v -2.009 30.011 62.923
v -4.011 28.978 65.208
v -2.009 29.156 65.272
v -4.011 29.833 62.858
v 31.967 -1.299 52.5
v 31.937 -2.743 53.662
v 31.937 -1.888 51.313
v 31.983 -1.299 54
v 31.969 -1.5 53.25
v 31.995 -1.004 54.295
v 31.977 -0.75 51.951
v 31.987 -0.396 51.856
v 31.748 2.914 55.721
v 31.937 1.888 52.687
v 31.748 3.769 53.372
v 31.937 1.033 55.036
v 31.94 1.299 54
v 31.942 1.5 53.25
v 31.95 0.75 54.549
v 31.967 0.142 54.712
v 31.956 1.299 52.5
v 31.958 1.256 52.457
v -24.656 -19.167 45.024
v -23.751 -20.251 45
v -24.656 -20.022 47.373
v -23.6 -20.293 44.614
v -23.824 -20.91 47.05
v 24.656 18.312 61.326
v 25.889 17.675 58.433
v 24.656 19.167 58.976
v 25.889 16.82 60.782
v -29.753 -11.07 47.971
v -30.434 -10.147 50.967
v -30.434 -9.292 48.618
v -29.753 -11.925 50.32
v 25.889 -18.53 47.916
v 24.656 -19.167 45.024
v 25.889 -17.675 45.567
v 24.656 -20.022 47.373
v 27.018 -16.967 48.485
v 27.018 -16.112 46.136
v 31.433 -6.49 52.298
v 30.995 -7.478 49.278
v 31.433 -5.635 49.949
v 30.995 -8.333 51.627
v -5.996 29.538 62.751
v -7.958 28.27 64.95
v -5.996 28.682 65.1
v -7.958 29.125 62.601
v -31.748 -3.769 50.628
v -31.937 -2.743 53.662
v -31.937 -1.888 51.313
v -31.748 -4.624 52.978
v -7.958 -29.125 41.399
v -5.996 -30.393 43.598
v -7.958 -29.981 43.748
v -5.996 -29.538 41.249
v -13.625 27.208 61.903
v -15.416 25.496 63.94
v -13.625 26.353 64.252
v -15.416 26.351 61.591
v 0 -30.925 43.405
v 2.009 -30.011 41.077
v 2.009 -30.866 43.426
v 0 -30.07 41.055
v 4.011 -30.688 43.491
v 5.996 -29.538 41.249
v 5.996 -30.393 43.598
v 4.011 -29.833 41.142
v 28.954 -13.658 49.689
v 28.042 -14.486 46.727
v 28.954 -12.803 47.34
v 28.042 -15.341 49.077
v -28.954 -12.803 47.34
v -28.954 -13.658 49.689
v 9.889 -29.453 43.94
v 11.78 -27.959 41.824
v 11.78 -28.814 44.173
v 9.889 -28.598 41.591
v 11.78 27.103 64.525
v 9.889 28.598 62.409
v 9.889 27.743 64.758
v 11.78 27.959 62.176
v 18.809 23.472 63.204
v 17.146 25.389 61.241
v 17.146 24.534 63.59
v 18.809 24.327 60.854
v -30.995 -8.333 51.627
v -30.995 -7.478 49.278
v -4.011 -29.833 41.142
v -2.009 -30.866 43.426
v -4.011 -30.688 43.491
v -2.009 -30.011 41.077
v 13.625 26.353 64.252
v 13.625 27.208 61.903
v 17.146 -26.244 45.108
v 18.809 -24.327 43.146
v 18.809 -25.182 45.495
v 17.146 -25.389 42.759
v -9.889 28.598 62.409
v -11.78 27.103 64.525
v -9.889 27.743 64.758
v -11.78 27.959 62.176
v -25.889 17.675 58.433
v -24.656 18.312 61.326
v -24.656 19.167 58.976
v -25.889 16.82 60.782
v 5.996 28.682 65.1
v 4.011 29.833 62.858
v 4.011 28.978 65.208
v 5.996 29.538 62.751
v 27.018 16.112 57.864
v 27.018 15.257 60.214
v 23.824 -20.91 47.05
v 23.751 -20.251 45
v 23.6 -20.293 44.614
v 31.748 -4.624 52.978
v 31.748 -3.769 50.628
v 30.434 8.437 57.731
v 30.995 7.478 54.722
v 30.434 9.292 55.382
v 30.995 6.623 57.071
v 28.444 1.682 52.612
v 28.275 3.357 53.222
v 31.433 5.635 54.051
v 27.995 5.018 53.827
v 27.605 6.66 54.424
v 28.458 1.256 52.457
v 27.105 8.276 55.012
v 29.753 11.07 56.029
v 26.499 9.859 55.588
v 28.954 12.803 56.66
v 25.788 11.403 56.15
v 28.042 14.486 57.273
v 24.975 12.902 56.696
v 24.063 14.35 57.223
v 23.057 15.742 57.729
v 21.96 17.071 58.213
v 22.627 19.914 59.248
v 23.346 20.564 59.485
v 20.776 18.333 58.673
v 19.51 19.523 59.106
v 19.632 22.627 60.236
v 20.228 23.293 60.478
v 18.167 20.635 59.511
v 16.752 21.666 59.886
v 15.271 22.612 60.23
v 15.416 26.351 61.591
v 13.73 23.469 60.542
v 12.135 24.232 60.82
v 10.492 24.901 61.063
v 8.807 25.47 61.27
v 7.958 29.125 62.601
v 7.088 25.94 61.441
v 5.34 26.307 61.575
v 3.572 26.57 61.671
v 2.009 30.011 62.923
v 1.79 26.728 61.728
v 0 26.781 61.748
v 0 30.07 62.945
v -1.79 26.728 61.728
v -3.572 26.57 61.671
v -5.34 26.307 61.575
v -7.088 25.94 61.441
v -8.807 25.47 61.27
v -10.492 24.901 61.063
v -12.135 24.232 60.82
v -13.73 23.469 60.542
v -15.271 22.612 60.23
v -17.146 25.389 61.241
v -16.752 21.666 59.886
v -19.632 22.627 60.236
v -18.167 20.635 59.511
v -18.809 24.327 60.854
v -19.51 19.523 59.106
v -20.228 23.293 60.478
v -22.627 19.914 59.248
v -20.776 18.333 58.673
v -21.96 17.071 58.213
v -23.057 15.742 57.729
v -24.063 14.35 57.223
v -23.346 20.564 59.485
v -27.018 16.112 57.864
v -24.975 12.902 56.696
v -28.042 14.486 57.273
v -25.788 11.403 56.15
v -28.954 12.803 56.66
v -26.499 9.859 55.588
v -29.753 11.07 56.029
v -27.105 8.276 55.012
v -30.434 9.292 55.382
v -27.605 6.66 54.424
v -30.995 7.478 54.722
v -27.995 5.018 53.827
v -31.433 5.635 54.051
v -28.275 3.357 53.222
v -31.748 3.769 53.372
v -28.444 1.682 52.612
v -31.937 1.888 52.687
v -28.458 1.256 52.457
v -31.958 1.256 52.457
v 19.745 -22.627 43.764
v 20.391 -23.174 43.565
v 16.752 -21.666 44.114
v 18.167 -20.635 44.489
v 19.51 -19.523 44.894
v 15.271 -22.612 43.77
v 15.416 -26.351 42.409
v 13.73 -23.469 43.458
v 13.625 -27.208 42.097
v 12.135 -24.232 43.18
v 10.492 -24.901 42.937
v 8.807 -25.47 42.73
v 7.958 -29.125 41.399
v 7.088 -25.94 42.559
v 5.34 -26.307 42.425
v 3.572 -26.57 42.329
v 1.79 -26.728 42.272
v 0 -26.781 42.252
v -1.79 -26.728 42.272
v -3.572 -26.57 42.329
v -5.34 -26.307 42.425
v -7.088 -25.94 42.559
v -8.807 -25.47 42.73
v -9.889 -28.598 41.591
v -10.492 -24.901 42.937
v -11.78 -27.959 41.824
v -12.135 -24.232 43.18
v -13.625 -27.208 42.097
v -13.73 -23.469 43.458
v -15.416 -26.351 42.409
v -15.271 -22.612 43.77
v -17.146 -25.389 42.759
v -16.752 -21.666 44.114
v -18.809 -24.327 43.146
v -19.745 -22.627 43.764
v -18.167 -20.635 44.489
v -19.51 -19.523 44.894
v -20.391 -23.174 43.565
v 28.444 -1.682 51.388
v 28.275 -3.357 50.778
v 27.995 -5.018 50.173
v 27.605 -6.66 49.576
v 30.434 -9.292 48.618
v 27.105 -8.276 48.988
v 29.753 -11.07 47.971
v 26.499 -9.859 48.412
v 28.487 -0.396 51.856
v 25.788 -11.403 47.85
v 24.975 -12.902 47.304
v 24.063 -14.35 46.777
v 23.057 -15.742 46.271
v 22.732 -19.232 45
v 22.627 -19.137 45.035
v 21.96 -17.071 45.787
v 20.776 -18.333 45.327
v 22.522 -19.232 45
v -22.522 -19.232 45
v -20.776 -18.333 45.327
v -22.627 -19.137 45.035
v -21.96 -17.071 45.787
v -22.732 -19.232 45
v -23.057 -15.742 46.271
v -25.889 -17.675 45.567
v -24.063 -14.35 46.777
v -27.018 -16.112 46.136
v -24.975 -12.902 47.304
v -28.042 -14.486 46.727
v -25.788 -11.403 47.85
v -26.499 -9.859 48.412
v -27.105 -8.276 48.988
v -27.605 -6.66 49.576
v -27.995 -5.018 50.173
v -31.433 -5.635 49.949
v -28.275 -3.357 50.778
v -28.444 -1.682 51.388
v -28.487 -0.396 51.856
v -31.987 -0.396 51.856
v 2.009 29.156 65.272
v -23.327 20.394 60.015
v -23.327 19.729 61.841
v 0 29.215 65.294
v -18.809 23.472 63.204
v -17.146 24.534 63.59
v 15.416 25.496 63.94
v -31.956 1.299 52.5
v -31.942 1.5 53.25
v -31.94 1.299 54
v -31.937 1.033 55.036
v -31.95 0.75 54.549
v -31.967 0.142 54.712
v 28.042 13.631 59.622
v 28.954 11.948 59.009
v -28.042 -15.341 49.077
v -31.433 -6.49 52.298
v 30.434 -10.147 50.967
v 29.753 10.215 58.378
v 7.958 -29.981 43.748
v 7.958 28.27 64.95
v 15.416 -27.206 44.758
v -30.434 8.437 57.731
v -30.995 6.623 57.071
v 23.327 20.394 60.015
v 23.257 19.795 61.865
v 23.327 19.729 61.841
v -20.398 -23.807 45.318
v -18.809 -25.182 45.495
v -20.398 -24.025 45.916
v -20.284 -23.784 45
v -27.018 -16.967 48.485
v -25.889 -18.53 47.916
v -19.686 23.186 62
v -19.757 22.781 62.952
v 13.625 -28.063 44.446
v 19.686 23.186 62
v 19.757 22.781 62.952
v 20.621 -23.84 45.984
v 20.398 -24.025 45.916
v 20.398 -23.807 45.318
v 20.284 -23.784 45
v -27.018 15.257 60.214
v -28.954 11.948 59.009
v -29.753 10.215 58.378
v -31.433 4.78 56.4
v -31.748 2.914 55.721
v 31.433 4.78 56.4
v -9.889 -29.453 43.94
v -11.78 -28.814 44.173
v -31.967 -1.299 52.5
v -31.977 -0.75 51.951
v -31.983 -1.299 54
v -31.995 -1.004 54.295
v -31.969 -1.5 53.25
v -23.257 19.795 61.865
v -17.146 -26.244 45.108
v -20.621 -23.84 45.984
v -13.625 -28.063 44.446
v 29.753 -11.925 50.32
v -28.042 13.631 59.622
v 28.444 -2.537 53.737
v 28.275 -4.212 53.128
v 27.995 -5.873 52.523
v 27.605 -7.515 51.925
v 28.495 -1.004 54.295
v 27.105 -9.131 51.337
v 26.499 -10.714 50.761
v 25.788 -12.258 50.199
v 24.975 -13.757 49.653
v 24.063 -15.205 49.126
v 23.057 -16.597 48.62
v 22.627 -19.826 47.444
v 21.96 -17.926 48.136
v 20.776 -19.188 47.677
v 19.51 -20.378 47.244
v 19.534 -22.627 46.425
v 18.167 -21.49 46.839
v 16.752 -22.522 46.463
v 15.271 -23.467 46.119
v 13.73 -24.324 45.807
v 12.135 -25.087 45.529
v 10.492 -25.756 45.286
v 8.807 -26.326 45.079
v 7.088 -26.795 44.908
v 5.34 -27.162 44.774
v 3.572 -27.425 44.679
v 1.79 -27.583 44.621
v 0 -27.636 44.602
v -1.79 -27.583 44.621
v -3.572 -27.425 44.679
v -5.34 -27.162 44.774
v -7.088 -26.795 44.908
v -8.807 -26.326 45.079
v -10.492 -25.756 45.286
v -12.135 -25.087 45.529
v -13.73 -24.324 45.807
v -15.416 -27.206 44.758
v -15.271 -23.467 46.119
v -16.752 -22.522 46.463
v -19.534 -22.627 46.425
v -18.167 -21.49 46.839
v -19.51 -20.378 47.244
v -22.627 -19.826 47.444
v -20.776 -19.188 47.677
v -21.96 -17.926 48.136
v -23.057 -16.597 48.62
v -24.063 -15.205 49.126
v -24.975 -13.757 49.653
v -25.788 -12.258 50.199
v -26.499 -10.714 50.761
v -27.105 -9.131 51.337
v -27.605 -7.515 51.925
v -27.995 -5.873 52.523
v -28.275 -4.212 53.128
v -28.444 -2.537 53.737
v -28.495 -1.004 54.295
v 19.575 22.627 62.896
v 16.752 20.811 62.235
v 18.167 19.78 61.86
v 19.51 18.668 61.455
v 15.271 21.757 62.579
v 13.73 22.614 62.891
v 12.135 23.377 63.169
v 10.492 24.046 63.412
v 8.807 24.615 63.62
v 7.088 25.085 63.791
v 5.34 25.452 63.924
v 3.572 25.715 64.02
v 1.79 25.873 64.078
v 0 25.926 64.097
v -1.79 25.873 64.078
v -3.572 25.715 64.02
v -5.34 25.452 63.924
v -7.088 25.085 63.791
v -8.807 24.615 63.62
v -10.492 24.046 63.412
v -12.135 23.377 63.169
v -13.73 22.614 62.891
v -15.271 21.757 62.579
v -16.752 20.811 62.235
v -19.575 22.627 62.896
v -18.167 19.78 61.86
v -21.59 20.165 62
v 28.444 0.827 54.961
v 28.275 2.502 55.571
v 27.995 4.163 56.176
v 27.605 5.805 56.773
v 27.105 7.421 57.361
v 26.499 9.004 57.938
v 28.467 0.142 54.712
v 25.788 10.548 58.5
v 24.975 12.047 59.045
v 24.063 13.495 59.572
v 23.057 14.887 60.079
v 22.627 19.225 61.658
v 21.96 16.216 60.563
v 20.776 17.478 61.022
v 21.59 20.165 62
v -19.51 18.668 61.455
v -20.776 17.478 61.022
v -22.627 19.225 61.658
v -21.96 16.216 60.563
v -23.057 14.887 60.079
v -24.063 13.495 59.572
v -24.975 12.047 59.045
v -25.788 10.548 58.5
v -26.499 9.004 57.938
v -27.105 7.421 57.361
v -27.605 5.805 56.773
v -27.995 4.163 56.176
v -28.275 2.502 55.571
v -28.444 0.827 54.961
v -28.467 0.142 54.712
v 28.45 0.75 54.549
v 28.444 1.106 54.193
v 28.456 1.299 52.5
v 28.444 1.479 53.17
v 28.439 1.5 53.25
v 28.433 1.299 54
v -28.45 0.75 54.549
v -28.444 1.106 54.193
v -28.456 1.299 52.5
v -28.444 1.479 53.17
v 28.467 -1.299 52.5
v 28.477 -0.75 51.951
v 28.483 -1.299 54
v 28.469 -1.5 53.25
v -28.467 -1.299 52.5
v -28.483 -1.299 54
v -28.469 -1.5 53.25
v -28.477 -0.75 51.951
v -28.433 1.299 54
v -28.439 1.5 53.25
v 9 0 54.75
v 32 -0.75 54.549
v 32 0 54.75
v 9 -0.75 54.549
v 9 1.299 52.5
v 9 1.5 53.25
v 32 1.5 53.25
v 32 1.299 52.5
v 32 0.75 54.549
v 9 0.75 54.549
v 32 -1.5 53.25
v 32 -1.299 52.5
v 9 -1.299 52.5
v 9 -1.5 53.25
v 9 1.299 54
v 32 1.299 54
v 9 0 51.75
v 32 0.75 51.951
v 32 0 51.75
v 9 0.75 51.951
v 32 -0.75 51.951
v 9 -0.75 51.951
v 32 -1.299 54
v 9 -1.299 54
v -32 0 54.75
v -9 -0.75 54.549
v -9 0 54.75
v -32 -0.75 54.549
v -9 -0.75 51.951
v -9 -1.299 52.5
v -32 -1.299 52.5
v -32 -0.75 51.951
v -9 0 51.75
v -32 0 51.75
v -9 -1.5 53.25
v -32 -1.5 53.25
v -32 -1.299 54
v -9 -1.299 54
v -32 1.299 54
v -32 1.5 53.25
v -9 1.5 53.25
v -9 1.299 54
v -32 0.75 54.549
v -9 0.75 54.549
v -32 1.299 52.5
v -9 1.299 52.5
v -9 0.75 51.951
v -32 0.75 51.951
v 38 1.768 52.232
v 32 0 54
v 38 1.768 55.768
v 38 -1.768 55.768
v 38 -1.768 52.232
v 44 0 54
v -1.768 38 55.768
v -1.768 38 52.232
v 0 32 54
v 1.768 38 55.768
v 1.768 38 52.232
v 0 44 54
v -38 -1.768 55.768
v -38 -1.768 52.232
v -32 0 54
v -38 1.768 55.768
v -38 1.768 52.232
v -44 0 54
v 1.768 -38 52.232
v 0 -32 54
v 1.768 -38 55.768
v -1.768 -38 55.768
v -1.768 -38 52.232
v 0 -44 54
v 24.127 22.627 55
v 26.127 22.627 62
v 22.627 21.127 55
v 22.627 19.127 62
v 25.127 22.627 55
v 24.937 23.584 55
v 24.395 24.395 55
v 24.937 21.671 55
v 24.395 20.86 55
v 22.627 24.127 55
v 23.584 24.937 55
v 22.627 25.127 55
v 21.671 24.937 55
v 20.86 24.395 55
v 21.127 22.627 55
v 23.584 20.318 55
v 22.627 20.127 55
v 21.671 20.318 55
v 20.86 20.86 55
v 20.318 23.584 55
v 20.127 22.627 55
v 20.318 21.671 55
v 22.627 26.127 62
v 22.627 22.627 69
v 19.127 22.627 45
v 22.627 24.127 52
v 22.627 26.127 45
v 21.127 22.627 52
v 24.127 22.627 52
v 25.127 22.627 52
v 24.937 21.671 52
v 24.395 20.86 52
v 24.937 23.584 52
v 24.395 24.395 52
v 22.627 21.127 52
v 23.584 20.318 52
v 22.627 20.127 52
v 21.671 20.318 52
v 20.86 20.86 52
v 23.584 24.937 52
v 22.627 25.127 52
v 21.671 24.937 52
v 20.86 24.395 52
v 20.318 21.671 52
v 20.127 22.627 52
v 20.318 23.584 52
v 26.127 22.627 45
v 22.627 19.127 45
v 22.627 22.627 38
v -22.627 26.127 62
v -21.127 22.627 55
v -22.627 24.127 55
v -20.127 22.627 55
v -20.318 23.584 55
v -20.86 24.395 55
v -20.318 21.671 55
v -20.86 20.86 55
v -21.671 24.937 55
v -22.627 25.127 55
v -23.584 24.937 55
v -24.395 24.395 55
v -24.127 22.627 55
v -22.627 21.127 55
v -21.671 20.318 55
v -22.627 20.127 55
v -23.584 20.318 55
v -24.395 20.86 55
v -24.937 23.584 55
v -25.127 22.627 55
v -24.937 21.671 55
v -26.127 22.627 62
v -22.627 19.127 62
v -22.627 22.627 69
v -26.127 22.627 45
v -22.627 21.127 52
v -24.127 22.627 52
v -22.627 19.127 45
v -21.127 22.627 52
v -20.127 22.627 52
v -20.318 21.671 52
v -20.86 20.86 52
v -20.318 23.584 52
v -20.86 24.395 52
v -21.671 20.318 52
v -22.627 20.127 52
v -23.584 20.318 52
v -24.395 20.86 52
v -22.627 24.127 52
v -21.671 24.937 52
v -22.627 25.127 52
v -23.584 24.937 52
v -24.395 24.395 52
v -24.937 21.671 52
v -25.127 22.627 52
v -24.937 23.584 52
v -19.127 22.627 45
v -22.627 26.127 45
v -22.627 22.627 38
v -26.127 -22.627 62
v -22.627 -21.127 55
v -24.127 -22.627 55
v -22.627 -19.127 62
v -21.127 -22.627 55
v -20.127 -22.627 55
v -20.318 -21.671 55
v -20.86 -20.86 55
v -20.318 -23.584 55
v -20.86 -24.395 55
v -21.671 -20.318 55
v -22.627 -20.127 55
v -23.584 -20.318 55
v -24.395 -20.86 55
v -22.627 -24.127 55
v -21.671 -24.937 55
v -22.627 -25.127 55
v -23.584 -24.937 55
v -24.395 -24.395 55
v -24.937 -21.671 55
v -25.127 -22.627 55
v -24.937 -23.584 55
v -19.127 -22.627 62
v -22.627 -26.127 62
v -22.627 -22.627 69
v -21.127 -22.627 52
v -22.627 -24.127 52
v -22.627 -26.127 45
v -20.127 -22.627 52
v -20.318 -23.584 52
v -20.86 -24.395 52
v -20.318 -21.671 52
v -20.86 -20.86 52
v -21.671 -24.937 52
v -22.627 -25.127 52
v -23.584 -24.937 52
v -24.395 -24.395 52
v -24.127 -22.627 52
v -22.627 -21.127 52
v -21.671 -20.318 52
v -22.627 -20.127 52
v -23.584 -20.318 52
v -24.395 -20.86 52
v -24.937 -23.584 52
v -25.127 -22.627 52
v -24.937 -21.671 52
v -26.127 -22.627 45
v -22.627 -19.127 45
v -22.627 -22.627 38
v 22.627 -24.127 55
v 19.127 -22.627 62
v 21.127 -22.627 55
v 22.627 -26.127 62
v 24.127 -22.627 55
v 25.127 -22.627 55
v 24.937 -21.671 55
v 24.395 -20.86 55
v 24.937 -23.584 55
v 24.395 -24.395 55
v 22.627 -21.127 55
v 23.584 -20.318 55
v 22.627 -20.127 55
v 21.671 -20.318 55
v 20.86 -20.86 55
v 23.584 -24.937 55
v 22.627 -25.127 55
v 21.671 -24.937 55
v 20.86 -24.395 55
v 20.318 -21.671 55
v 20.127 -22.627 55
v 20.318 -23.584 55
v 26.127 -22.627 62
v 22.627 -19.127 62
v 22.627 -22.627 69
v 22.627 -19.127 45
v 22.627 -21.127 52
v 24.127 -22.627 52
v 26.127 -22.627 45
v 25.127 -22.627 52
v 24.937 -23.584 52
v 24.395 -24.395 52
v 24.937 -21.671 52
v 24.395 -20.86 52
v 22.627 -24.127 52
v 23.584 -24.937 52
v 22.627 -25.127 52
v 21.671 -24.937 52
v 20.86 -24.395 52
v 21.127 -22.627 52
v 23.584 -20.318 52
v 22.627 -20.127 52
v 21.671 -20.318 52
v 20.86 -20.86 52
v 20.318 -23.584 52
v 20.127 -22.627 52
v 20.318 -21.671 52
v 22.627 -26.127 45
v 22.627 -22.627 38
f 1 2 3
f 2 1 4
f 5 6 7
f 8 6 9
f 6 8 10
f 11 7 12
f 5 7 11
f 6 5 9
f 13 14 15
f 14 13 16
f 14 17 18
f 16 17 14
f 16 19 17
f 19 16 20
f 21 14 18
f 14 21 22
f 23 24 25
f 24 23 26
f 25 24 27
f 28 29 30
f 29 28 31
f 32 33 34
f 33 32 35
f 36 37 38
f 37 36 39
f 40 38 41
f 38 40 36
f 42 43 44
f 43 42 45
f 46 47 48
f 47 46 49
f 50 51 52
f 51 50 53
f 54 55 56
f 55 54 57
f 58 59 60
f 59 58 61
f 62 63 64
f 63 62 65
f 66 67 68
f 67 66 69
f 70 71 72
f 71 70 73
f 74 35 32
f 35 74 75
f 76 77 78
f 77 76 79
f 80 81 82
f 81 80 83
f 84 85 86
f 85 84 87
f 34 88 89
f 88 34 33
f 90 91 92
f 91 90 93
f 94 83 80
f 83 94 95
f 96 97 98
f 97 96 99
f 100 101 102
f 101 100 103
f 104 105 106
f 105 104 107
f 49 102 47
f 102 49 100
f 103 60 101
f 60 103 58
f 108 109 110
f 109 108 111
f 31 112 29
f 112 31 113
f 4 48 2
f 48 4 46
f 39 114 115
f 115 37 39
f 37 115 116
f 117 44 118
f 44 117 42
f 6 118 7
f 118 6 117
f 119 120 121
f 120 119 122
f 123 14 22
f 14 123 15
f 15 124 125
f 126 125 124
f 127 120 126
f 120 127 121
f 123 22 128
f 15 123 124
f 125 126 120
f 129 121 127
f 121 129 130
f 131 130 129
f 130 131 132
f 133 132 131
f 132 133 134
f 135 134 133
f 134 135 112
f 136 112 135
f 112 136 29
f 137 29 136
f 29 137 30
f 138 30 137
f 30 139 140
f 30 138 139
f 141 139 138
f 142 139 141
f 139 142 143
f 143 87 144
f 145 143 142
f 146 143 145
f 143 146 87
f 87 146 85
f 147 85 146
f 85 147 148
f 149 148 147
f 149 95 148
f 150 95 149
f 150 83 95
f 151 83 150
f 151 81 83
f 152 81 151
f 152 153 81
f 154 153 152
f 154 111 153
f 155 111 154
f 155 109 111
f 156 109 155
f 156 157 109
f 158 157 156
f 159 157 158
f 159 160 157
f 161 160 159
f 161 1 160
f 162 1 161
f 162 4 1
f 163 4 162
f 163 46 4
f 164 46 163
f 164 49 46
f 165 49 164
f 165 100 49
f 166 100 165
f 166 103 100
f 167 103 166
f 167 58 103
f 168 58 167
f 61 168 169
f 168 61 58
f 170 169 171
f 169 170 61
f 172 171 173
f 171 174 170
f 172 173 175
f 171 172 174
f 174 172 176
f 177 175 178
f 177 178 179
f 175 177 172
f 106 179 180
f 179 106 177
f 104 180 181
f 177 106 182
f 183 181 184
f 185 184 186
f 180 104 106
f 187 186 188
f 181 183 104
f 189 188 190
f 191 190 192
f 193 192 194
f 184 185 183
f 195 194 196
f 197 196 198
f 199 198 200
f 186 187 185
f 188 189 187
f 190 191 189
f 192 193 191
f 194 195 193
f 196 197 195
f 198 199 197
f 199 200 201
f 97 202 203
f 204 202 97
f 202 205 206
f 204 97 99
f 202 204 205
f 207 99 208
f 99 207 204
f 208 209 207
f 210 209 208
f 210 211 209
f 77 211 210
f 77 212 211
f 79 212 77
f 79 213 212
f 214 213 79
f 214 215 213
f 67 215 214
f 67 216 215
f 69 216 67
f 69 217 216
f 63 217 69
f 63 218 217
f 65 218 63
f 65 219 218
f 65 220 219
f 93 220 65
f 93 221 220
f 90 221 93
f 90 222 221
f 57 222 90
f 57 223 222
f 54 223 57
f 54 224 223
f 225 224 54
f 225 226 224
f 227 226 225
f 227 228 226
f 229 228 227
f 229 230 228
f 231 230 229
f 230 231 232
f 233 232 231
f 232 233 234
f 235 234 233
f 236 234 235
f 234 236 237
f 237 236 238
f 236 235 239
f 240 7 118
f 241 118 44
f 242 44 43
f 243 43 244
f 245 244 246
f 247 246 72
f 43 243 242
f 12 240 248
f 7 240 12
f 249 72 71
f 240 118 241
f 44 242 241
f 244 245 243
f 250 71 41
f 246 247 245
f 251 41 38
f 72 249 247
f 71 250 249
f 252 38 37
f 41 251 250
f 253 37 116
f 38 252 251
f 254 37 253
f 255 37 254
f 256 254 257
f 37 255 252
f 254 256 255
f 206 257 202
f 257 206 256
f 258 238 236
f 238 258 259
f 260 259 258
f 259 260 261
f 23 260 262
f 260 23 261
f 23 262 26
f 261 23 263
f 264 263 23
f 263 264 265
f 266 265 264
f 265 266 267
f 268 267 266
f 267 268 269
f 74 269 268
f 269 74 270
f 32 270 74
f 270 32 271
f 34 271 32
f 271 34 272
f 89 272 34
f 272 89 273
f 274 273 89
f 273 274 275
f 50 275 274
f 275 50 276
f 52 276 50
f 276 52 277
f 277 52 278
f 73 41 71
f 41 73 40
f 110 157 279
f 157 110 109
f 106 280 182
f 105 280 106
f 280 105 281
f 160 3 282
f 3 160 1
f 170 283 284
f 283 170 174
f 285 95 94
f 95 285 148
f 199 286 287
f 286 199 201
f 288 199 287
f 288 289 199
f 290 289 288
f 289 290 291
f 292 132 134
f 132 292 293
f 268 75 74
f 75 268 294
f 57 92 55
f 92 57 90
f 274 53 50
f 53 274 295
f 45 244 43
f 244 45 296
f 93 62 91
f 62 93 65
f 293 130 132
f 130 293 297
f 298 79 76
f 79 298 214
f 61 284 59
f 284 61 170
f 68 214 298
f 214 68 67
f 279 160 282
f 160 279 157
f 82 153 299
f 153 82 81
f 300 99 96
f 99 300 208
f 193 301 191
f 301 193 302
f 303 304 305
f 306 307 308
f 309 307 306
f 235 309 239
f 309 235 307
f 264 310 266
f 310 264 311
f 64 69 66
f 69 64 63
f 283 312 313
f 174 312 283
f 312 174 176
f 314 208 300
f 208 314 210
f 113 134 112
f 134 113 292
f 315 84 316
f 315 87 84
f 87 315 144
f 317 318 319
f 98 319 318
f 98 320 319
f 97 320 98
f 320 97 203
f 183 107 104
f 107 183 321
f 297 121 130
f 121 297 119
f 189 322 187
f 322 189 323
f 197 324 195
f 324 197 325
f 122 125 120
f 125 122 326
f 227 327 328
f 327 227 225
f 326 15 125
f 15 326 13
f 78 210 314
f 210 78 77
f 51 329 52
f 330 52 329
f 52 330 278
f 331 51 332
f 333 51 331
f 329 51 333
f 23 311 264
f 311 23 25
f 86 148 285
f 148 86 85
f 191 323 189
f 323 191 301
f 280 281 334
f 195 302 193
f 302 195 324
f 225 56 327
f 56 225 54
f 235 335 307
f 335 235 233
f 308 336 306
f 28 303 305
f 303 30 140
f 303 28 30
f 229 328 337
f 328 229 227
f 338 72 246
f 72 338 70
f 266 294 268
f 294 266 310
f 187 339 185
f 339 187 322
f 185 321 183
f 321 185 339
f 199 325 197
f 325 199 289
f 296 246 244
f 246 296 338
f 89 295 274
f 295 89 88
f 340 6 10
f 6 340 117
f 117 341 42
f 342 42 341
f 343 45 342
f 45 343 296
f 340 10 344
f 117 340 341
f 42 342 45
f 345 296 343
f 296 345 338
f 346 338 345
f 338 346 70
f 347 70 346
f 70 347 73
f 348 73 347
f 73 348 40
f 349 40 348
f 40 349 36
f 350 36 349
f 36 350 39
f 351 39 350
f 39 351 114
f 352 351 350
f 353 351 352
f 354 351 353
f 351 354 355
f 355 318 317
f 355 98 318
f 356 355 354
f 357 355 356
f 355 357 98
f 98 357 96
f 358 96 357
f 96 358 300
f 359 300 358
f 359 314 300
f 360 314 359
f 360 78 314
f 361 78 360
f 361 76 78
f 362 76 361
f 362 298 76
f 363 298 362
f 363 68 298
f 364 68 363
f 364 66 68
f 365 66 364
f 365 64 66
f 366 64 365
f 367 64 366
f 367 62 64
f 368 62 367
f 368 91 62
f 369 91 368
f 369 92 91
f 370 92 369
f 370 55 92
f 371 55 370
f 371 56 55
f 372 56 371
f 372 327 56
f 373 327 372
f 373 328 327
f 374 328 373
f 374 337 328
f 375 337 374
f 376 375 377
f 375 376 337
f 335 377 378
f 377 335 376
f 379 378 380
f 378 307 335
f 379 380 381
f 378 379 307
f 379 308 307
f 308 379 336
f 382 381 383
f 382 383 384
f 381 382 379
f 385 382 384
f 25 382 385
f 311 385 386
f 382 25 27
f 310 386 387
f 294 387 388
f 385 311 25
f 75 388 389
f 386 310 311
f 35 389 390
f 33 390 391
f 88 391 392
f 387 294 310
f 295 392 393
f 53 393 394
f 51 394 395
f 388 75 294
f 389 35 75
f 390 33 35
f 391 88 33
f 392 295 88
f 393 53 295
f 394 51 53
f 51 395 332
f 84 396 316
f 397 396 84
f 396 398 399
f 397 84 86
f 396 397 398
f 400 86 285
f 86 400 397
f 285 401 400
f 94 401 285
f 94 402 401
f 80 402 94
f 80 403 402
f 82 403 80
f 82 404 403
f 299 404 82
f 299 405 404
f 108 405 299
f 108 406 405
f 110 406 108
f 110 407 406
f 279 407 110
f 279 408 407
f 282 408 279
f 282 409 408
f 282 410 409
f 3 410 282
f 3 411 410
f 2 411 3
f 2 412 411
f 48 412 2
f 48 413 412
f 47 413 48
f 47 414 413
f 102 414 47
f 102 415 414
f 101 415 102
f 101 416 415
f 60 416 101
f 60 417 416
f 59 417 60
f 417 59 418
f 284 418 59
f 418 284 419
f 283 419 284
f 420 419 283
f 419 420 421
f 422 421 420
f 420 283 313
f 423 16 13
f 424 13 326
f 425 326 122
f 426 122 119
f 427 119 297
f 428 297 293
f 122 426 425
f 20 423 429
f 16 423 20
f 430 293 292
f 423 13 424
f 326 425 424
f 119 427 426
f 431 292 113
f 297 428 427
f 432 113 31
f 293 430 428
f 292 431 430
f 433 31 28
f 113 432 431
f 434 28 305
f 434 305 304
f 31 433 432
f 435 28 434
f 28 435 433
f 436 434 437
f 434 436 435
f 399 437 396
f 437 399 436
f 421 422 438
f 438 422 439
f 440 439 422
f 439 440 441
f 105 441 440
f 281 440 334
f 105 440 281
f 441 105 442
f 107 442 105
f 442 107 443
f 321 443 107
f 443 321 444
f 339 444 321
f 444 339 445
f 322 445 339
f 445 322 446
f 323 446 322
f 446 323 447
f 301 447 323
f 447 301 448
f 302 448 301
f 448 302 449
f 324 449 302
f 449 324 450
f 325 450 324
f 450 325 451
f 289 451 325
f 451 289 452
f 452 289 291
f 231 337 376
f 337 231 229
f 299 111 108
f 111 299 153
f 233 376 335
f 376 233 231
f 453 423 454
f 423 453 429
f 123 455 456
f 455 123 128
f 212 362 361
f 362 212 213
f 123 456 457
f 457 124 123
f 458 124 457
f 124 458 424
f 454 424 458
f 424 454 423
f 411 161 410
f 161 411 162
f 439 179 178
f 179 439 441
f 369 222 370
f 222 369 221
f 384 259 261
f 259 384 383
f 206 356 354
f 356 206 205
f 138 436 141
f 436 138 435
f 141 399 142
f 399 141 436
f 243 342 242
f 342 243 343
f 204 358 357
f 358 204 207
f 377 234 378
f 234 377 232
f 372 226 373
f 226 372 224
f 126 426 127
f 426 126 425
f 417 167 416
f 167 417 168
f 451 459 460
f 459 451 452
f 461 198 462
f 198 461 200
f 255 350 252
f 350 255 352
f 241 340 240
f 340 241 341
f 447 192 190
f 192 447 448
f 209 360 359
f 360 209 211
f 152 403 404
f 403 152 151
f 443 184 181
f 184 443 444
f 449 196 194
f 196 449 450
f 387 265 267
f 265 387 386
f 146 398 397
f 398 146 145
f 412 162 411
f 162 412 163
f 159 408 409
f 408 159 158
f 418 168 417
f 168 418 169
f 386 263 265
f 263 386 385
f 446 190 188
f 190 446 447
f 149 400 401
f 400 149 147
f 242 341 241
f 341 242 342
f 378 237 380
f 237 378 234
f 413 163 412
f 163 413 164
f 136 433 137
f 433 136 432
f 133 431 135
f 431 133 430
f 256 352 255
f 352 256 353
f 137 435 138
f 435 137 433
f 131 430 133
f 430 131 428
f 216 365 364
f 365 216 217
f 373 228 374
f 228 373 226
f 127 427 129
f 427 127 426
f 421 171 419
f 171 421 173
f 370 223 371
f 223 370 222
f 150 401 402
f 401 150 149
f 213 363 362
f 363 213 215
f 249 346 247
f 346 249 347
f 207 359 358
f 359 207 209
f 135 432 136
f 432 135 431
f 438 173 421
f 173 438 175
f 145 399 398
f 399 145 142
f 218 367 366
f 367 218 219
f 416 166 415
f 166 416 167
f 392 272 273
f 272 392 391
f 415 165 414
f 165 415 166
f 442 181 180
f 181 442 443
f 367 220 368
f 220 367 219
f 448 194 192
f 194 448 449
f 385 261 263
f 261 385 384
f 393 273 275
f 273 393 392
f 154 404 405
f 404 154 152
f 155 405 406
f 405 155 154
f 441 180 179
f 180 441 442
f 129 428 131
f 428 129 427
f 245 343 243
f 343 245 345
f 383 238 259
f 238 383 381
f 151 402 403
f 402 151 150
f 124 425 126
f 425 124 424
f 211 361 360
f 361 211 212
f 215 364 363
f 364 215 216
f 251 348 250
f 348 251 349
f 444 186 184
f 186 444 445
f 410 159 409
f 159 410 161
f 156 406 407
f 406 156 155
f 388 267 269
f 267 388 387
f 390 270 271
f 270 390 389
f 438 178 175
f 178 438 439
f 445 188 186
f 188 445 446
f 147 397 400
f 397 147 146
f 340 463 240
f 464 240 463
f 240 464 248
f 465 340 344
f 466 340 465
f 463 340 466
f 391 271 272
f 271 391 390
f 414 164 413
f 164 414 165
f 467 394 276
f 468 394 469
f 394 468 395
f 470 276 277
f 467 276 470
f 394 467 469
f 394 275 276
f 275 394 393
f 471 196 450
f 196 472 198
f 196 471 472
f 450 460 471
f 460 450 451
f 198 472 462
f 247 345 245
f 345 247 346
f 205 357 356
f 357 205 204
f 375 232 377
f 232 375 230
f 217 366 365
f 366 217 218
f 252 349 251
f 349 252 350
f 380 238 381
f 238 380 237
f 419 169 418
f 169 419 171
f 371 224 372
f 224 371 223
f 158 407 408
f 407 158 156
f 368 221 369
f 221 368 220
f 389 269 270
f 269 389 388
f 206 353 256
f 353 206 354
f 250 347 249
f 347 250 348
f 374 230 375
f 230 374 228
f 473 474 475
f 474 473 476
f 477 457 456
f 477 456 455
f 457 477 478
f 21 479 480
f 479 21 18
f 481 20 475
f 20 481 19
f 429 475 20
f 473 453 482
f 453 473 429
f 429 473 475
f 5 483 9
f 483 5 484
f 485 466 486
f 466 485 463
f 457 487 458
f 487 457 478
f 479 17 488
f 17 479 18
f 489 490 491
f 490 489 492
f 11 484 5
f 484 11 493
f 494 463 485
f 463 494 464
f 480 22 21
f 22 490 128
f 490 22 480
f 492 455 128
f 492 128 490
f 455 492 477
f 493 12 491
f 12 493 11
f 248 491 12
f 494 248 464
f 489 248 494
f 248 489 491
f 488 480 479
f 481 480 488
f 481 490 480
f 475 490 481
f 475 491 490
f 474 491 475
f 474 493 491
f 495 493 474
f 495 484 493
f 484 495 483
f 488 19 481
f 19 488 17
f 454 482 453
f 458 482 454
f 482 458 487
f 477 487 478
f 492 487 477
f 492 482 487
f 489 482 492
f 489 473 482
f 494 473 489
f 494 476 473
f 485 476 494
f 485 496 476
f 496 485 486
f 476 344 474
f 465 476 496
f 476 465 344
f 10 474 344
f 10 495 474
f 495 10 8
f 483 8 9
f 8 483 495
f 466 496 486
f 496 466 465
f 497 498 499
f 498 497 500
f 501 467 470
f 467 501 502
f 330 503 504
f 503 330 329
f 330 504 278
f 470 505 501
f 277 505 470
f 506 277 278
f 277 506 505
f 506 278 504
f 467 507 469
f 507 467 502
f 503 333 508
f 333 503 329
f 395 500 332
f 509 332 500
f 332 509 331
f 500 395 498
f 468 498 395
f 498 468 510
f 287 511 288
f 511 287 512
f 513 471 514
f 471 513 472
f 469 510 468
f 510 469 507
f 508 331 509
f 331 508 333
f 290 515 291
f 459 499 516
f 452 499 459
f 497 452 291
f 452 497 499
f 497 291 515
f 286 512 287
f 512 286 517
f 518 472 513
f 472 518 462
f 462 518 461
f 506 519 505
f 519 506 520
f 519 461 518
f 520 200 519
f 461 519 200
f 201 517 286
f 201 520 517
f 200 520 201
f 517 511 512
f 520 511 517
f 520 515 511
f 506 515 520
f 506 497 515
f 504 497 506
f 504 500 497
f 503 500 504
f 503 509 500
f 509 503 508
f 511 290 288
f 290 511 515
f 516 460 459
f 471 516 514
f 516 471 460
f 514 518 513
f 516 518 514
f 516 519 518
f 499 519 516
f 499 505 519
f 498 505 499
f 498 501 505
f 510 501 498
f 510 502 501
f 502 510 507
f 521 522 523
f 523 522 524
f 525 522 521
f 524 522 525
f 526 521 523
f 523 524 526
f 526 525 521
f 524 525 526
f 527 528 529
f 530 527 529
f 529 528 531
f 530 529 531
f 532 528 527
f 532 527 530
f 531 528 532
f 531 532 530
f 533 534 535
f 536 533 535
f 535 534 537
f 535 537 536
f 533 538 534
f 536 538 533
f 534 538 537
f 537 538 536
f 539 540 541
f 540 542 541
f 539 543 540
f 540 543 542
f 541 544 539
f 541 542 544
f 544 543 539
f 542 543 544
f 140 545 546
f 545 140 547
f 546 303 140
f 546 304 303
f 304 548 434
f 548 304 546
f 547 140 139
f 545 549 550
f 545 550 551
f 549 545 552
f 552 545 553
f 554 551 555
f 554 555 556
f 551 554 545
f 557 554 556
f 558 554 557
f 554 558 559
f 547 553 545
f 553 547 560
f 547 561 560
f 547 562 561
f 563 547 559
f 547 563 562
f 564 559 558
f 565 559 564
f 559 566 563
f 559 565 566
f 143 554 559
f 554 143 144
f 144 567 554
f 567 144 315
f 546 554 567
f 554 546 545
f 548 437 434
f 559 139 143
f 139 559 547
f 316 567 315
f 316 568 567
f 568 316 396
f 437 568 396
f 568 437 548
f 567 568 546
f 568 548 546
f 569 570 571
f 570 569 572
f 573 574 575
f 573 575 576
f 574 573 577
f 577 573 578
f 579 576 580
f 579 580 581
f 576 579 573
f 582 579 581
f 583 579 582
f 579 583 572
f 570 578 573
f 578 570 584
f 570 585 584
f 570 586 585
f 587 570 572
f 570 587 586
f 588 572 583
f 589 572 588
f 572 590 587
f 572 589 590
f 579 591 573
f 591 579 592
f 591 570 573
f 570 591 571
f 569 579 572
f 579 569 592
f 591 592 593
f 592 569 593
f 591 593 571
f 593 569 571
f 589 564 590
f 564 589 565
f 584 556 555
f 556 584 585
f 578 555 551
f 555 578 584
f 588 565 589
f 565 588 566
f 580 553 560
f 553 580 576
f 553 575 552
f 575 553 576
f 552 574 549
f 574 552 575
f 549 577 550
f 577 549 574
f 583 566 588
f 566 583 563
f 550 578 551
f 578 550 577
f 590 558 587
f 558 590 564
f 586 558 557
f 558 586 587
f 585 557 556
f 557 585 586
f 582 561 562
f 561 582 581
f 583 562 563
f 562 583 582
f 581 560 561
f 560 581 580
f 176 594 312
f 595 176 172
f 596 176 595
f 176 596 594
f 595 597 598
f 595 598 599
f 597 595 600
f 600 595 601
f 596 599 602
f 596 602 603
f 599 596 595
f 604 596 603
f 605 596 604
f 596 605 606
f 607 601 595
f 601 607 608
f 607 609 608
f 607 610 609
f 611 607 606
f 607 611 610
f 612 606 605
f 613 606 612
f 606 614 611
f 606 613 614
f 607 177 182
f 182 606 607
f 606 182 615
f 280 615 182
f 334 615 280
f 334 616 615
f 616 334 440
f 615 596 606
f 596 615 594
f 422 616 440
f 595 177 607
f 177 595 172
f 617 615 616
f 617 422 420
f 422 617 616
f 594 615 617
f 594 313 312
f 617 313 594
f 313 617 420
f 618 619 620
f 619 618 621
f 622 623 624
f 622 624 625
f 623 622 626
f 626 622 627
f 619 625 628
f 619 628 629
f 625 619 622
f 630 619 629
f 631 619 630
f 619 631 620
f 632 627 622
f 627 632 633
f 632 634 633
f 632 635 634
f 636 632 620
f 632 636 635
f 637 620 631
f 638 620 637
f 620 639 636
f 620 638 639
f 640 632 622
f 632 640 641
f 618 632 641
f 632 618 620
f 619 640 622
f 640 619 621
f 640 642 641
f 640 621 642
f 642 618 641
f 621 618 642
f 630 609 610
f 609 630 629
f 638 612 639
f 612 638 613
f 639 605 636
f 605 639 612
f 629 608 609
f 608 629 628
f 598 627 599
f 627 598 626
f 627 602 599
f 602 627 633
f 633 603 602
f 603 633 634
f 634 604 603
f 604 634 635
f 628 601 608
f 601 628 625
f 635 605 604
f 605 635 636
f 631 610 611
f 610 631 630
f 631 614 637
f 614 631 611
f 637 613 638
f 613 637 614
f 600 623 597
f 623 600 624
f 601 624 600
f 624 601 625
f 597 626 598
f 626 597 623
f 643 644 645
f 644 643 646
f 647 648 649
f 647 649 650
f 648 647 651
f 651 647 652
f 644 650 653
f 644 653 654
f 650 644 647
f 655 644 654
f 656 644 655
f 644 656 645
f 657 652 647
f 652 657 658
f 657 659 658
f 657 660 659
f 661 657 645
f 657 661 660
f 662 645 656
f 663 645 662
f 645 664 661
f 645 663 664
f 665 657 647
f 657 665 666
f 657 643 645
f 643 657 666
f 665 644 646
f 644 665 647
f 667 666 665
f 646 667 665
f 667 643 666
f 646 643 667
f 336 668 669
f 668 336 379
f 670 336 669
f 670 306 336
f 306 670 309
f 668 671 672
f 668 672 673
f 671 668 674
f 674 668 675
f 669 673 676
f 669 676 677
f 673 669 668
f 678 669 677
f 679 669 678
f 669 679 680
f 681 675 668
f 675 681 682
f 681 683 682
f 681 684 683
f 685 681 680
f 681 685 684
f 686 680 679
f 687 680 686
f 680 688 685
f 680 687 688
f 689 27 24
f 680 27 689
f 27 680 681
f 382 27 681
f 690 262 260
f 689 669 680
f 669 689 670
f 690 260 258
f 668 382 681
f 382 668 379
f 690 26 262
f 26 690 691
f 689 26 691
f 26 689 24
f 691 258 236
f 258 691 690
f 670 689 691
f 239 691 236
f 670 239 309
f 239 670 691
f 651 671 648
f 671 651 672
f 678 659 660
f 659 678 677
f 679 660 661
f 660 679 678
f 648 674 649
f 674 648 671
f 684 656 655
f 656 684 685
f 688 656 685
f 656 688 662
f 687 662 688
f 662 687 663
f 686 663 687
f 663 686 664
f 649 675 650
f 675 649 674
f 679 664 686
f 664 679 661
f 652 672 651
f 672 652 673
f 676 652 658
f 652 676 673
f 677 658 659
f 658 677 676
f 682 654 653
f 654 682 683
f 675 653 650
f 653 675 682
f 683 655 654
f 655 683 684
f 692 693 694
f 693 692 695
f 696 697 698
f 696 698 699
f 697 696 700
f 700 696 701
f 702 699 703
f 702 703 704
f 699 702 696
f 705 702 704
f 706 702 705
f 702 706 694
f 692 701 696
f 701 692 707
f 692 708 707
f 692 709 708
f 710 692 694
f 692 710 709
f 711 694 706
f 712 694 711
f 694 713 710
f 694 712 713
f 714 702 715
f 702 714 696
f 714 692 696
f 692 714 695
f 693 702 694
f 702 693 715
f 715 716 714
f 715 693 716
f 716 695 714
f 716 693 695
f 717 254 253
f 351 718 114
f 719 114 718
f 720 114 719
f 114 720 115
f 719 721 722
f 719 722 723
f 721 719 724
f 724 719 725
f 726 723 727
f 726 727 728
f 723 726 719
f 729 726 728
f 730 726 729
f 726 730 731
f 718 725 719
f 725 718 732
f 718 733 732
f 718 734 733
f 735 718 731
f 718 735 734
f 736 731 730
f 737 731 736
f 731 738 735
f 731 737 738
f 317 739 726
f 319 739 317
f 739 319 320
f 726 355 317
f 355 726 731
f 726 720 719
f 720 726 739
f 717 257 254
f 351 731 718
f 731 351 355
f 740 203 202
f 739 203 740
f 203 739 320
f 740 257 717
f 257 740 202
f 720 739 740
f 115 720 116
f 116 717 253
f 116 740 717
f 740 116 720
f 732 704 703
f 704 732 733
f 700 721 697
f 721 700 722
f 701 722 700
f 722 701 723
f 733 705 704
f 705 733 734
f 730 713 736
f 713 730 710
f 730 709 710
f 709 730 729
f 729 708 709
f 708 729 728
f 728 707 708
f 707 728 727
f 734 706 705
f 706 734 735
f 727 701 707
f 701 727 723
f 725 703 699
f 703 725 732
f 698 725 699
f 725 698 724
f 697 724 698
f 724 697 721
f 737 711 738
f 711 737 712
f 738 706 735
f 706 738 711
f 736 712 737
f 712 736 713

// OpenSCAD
// AETHERYTE – PART 4: RING ASSEMBLY

$fn = 50;

ring_radius    = 32;
ring_thickness = 2.5;
ring_z         = 52;

collar_radius = 9;

prong_count = 4;
prong_out = ring_radius;
prong_z = ring_z + 2;

small_crystal_count = 4;
small_crystal_out = ring_radius;
small_crystal_z = ring_z;
small_crystal_length = 14;

support_bar_r = 1.5;

union()
{
    halo_ring();
    ring_supports();
    prongs();
    outer_crystals();
}

// halo ring
module halo_ring()
{
    translate([0, 0, ring_z])
    rotate([20, 0, 0])
    difference()
    {
        cylinder(h = ring_thickness, r = ring_radius, $fn = 100);
        translate([0, 0, -1])
            cylinder(h = ring_thickness + 2,
                     r = ring_radius - ring_thickness - 1, $fn = 100);
    }
}

// ring supports
module ring_supports()
{
    support_length = ring_radius - collar_radius;

    for (i = [0 : 1])
    {
        rotate([0, 0, i * 180])
        translate([collar_radius, 0, ring_z + ring_thickness / 2])
        rotate([0, 90, 0])
            cylinder(h = support_length, r = support_bar_r, $fn = 12);
    }
}

// prongs – four diamond spikes on the ring
module prong()
{
    rotate([0, 0, 45])
    union()
    {
        cylinder(h = 6, r1 = 0, r2 = 2.5, $fn = 4);
        translate([0, 0, 6])
            cylinder(h = 6, r1 = 2.5, r2 = 0, $fn = 4);
    }
}

module prongs()
{
    for (i = [0 : prong_count - 1])
    {
        rotate([0, 0, i * (360 / prong_count)])
        translate([prong_out, 0, prong_z])
        rotate([0, 90, 0])
            prong();
    }
}

// outer crystals – up/down spike pairs on the ring
module outer_crystal_spike(len = small_crystal_length)
{
    rotate([0, 0, 45])
    union()
    {
        cylinder(h = len / 2, r1 = 1.5, r2 = 3.5, $fn = 4);
        translate([0, 0, len / 2])
            cylinder(h = len / 2, r1 = 3.5, r2 = 0, $fn = 4);
    }
}

module crystal_mount()
{
    cylinder(h = 3, r = 2.5, $fn = 16);
}

module outer_crystals()
{
    for (i = [0 : small_crystal_count - 1])
    {
        rotate([0, 0, i * (360 / small_crystal_count) + 45])
        translate([small_crystal_out, 0, small_crystal_z])
        union()
        {
            crystal_mount();

            translate([0, 0, 3])
                outer_crystal_spike(small_crystal_length);

            rotate([180, 0, 0])
                outer_crystal_spike(small_crystal_length);
        }
    }
}
